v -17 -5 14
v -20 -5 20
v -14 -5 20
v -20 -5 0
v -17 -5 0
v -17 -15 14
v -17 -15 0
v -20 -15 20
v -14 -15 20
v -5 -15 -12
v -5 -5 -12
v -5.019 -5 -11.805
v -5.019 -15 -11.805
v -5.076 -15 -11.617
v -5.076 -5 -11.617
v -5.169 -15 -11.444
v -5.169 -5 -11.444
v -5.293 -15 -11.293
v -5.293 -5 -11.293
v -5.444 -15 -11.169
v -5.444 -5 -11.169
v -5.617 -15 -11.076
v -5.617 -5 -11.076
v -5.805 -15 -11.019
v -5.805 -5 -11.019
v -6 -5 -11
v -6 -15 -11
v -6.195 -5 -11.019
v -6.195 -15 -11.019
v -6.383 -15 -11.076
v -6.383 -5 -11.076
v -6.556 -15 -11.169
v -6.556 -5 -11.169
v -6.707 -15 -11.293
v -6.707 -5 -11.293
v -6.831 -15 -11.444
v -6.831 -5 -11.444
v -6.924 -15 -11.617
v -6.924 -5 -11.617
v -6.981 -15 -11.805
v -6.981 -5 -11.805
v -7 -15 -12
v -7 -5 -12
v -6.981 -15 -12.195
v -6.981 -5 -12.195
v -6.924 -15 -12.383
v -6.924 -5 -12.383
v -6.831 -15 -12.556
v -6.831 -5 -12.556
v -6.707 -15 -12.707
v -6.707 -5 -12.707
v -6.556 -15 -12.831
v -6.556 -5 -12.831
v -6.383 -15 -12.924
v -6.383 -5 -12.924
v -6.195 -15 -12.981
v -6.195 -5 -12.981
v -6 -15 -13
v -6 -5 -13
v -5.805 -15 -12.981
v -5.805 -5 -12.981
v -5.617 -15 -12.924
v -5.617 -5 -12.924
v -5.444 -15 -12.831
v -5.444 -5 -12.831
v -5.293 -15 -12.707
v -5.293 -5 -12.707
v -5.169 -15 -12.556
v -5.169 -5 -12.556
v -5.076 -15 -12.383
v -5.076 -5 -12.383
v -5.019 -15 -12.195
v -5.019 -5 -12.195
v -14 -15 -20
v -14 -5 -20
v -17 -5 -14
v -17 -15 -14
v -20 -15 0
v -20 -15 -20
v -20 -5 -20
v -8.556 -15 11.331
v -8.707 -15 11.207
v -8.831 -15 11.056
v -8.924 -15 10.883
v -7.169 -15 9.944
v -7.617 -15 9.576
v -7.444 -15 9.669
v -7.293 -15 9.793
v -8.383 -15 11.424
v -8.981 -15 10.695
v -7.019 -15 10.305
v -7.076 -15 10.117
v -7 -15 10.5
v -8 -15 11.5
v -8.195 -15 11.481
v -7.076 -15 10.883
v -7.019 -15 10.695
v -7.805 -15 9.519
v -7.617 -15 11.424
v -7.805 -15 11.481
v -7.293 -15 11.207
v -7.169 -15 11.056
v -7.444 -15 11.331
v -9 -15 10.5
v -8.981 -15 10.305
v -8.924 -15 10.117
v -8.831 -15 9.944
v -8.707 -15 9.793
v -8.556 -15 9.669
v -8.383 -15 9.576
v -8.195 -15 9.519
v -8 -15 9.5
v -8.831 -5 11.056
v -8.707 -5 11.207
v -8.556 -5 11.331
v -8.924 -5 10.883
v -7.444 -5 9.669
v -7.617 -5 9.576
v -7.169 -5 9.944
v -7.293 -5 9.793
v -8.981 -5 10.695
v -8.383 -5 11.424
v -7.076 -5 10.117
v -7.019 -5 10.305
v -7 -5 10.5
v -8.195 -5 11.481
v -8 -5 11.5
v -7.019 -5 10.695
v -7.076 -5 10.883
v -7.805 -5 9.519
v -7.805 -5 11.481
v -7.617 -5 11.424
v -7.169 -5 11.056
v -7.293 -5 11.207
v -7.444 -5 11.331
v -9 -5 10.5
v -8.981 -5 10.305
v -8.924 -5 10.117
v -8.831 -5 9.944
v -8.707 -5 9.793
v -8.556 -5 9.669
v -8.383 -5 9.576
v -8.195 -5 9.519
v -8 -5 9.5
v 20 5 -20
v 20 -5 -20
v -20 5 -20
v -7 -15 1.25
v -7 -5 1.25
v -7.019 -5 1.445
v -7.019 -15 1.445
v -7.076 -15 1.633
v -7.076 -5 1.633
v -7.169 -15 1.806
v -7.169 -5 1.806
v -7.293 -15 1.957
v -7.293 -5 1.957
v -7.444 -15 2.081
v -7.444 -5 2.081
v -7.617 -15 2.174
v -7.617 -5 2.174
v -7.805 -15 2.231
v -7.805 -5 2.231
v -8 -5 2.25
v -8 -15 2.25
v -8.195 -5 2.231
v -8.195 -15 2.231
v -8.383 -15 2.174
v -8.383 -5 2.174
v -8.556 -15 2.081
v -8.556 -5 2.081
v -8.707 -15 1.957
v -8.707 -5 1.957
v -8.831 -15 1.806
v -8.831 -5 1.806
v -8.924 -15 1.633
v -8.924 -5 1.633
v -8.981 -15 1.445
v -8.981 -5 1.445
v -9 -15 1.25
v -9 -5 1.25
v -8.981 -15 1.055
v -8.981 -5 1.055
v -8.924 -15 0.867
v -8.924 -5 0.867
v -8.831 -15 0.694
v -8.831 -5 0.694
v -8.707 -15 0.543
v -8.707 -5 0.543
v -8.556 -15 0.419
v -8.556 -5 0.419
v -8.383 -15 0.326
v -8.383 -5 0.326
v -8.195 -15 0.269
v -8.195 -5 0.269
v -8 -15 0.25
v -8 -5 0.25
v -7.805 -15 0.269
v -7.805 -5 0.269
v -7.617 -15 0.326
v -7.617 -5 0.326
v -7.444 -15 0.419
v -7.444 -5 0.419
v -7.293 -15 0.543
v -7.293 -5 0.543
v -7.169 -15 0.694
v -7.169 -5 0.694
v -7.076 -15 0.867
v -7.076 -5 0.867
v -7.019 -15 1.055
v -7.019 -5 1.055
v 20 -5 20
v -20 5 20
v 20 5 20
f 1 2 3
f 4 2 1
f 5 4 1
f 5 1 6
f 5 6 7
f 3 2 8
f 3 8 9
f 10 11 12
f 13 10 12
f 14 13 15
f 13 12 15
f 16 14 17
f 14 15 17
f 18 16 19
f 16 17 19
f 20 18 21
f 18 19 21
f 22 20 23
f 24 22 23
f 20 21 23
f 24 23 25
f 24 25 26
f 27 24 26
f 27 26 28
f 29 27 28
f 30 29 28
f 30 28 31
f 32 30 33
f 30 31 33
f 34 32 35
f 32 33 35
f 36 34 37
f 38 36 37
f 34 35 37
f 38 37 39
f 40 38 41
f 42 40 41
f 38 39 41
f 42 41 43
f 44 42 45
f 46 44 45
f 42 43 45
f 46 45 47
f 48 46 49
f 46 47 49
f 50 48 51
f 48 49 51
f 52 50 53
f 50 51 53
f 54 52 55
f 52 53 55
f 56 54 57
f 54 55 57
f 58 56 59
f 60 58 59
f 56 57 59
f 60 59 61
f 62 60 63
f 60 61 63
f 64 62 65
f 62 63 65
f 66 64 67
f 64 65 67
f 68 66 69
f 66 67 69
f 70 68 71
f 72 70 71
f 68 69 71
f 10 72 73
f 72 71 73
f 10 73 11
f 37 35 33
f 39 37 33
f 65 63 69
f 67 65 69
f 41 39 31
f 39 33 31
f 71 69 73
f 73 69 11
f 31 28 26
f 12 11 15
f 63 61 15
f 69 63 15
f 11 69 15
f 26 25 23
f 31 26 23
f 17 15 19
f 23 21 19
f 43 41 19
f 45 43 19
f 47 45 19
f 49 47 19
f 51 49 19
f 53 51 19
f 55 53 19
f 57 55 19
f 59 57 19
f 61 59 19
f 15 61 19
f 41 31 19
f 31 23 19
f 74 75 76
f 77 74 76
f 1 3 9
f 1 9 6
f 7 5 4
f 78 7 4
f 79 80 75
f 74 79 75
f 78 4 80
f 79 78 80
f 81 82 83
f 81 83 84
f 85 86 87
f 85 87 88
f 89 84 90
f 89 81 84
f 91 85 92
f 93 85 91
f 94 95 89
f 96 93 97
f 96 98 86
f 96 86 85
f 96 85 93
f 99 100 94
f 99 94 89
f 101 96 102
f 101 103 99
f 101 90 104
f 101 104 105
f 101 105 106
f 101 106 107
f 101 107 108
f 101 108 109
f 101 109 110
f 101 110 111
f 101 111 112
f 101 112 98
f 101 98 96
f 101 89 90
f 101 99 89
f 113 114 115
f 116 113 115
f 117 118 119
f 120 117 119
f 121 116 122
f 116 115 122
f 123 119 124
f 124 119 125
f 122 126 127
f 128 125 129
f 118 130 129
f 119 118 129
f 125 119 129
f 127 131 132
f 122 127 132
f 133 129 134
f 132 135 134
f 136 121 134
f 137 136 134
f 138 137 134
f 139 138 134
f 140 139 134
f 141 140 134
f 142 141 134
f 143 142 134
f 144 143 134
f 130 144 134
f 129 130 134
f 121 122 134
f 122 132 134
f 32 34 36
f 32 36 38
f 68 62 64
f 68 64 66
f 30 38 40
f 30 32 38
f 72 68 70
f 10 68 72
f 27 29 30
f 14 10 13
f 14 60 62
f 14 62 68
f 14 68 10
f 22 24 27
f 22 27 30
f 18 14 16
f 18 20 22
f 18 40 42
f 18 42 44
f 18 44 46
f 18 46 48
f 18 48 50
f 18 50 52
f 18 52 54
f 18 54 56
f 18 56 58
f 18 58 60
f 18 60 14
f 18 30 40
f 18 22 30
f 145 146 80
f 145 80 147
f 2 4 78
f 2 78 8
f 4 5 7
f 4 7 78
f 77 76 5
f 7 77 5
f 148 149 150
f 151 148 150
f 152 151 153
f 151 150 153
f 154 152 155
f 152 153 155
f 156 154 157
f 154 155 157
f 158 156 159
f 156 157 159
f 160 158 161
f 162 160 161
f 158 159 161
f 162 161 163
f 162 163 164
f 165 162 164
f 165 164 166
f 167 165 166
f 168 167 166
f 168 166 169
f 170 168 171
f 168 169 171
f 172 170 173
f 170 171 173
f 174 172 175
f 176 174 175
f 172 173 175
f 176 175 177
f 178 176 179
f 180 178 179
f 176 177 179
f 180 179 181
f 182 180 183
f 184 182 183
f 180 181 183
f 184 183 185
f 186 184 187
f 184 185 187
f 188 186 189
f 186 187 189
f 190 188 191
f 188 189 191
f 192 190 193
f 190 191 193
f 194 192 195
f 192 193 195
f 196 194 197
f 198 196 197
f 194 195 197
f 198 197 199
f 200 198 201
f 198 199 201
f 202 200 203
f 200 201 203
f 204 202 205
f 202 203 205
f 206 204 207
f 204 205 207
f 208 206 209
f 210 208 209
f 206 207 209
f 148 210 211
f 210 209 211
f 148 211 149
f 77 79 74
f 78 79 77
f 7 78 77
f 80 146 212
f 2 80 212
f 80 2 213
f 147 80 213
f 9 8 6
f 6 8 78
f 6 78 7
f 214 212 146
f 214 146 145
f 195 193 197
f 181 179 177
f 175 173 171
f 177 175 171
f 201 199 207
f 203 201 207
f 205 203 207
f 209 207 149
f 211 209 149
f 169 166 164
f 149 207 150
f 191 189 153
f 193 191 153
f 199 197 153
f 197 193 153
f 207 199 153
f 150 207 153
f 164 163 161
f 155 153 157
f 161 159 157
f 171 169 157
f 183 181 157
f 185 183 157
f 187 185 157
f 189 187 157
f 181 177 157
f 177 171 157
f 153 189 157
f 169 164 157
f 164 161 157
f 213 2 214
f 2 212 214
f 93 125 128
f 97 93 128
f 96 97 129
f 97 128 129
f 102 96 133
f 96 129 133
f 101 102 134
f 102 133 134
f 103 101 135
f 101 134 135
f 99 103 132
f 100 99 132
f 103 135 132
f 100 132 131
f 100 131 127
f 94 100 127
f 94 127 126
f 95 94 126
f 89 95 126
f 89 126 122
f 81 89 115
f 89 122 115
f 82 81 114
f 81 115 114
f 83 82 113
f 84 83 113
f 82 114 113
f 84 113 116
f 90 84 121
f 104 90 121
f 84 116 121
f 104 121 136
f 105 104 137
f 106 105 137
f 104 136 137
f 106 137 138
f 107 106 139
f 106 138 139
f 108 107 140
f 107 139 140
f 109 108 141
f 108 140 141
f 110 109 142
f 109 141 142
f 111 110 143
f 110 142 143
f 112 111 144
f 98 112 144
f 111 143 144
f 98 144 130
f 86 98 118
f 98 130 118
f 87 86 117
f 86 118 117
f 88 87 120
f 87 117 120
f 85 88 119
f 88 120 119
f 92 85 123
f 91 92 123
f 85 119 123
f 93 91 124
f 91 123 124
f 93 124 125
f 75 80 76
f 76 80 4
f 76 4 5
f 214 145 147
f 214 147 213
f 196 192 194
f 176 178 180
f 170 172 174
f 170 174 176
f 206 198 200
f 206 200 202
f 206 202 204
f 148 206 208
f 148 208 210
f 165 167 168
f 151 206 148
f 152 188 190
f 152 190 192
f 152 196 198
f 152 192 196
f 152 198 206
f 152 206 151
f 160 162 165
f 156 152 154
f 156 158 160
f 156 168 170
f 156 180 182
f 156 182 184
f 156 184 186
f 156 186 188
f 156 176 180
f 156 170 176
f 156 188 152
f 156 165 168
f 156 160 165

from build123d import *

# Parameters (mm, degrees)
F0_W          = 10
F0_H          = 40
F1_DEPTH      = 20
F1_DEPTH_BACK = 20
F2_R          = 1
F3_DEPTH      = 10


with BuildPart() as f1:
    # F0 (on Right) → F1 (new body, two sides)
    with BuildSketch(Plane.YZ) as f1_sk:
        Rectangle(F0_W, F0_H)
    extrude(amount=F1_DEPTH)
    extrude(f1_sk.sketch, amount=-F1_DEPTH_BACK)


with BuildPart() as f3:
    # F2 (on face) → F3 (new body)
    with BuildSketch(Plane.XZ.offset(5)):
        with Locations((-8, 10.5)):
            Circle(F2_R)
    extrude(amount=F3_DEPTH)


with BuildPart() as f3b:
    # F2 (on face) → F3, piece 2 (new body)
    with BuildSketch(Plane.XZ.offset(5)):
        with Locations((-8, 1.25)):
            Circle(F2_R)
    extrude(amount=F3_DEPTH)


with BuildPart() as f3c:
    # F2 (on face) → F3, piece 3 (new body)
    with BuildSketch(Plane.XZ.offset(5)):
        with Locations((-6, -12)):
            Circle(F2_R)
    extrude(amount=F3_DEPTH)


with BuildPart() as f3d:
    # F2 (on face) → F3, piece 4 (new body)
    with BuildSketch(Plane.XZ.offset(5)):
        Polygon((-20, -20), (-14, -20), (-17, -14), (-17, 0), (-20, 0), align=None)
    extrude(amount=F3_DEPTH)


with BuildPart() as f4_1:
    # F4: instance of F3d
    add(f3d.part.mirror(Plane(origin=(-18.5, -10, 0), x_dir=(1, 0, 0), z_dir=(0, 0, 1))))


solid = Compound([f1.part, f3.part, f3b.part, f3c.part, f3d.part, f4_1.part])
